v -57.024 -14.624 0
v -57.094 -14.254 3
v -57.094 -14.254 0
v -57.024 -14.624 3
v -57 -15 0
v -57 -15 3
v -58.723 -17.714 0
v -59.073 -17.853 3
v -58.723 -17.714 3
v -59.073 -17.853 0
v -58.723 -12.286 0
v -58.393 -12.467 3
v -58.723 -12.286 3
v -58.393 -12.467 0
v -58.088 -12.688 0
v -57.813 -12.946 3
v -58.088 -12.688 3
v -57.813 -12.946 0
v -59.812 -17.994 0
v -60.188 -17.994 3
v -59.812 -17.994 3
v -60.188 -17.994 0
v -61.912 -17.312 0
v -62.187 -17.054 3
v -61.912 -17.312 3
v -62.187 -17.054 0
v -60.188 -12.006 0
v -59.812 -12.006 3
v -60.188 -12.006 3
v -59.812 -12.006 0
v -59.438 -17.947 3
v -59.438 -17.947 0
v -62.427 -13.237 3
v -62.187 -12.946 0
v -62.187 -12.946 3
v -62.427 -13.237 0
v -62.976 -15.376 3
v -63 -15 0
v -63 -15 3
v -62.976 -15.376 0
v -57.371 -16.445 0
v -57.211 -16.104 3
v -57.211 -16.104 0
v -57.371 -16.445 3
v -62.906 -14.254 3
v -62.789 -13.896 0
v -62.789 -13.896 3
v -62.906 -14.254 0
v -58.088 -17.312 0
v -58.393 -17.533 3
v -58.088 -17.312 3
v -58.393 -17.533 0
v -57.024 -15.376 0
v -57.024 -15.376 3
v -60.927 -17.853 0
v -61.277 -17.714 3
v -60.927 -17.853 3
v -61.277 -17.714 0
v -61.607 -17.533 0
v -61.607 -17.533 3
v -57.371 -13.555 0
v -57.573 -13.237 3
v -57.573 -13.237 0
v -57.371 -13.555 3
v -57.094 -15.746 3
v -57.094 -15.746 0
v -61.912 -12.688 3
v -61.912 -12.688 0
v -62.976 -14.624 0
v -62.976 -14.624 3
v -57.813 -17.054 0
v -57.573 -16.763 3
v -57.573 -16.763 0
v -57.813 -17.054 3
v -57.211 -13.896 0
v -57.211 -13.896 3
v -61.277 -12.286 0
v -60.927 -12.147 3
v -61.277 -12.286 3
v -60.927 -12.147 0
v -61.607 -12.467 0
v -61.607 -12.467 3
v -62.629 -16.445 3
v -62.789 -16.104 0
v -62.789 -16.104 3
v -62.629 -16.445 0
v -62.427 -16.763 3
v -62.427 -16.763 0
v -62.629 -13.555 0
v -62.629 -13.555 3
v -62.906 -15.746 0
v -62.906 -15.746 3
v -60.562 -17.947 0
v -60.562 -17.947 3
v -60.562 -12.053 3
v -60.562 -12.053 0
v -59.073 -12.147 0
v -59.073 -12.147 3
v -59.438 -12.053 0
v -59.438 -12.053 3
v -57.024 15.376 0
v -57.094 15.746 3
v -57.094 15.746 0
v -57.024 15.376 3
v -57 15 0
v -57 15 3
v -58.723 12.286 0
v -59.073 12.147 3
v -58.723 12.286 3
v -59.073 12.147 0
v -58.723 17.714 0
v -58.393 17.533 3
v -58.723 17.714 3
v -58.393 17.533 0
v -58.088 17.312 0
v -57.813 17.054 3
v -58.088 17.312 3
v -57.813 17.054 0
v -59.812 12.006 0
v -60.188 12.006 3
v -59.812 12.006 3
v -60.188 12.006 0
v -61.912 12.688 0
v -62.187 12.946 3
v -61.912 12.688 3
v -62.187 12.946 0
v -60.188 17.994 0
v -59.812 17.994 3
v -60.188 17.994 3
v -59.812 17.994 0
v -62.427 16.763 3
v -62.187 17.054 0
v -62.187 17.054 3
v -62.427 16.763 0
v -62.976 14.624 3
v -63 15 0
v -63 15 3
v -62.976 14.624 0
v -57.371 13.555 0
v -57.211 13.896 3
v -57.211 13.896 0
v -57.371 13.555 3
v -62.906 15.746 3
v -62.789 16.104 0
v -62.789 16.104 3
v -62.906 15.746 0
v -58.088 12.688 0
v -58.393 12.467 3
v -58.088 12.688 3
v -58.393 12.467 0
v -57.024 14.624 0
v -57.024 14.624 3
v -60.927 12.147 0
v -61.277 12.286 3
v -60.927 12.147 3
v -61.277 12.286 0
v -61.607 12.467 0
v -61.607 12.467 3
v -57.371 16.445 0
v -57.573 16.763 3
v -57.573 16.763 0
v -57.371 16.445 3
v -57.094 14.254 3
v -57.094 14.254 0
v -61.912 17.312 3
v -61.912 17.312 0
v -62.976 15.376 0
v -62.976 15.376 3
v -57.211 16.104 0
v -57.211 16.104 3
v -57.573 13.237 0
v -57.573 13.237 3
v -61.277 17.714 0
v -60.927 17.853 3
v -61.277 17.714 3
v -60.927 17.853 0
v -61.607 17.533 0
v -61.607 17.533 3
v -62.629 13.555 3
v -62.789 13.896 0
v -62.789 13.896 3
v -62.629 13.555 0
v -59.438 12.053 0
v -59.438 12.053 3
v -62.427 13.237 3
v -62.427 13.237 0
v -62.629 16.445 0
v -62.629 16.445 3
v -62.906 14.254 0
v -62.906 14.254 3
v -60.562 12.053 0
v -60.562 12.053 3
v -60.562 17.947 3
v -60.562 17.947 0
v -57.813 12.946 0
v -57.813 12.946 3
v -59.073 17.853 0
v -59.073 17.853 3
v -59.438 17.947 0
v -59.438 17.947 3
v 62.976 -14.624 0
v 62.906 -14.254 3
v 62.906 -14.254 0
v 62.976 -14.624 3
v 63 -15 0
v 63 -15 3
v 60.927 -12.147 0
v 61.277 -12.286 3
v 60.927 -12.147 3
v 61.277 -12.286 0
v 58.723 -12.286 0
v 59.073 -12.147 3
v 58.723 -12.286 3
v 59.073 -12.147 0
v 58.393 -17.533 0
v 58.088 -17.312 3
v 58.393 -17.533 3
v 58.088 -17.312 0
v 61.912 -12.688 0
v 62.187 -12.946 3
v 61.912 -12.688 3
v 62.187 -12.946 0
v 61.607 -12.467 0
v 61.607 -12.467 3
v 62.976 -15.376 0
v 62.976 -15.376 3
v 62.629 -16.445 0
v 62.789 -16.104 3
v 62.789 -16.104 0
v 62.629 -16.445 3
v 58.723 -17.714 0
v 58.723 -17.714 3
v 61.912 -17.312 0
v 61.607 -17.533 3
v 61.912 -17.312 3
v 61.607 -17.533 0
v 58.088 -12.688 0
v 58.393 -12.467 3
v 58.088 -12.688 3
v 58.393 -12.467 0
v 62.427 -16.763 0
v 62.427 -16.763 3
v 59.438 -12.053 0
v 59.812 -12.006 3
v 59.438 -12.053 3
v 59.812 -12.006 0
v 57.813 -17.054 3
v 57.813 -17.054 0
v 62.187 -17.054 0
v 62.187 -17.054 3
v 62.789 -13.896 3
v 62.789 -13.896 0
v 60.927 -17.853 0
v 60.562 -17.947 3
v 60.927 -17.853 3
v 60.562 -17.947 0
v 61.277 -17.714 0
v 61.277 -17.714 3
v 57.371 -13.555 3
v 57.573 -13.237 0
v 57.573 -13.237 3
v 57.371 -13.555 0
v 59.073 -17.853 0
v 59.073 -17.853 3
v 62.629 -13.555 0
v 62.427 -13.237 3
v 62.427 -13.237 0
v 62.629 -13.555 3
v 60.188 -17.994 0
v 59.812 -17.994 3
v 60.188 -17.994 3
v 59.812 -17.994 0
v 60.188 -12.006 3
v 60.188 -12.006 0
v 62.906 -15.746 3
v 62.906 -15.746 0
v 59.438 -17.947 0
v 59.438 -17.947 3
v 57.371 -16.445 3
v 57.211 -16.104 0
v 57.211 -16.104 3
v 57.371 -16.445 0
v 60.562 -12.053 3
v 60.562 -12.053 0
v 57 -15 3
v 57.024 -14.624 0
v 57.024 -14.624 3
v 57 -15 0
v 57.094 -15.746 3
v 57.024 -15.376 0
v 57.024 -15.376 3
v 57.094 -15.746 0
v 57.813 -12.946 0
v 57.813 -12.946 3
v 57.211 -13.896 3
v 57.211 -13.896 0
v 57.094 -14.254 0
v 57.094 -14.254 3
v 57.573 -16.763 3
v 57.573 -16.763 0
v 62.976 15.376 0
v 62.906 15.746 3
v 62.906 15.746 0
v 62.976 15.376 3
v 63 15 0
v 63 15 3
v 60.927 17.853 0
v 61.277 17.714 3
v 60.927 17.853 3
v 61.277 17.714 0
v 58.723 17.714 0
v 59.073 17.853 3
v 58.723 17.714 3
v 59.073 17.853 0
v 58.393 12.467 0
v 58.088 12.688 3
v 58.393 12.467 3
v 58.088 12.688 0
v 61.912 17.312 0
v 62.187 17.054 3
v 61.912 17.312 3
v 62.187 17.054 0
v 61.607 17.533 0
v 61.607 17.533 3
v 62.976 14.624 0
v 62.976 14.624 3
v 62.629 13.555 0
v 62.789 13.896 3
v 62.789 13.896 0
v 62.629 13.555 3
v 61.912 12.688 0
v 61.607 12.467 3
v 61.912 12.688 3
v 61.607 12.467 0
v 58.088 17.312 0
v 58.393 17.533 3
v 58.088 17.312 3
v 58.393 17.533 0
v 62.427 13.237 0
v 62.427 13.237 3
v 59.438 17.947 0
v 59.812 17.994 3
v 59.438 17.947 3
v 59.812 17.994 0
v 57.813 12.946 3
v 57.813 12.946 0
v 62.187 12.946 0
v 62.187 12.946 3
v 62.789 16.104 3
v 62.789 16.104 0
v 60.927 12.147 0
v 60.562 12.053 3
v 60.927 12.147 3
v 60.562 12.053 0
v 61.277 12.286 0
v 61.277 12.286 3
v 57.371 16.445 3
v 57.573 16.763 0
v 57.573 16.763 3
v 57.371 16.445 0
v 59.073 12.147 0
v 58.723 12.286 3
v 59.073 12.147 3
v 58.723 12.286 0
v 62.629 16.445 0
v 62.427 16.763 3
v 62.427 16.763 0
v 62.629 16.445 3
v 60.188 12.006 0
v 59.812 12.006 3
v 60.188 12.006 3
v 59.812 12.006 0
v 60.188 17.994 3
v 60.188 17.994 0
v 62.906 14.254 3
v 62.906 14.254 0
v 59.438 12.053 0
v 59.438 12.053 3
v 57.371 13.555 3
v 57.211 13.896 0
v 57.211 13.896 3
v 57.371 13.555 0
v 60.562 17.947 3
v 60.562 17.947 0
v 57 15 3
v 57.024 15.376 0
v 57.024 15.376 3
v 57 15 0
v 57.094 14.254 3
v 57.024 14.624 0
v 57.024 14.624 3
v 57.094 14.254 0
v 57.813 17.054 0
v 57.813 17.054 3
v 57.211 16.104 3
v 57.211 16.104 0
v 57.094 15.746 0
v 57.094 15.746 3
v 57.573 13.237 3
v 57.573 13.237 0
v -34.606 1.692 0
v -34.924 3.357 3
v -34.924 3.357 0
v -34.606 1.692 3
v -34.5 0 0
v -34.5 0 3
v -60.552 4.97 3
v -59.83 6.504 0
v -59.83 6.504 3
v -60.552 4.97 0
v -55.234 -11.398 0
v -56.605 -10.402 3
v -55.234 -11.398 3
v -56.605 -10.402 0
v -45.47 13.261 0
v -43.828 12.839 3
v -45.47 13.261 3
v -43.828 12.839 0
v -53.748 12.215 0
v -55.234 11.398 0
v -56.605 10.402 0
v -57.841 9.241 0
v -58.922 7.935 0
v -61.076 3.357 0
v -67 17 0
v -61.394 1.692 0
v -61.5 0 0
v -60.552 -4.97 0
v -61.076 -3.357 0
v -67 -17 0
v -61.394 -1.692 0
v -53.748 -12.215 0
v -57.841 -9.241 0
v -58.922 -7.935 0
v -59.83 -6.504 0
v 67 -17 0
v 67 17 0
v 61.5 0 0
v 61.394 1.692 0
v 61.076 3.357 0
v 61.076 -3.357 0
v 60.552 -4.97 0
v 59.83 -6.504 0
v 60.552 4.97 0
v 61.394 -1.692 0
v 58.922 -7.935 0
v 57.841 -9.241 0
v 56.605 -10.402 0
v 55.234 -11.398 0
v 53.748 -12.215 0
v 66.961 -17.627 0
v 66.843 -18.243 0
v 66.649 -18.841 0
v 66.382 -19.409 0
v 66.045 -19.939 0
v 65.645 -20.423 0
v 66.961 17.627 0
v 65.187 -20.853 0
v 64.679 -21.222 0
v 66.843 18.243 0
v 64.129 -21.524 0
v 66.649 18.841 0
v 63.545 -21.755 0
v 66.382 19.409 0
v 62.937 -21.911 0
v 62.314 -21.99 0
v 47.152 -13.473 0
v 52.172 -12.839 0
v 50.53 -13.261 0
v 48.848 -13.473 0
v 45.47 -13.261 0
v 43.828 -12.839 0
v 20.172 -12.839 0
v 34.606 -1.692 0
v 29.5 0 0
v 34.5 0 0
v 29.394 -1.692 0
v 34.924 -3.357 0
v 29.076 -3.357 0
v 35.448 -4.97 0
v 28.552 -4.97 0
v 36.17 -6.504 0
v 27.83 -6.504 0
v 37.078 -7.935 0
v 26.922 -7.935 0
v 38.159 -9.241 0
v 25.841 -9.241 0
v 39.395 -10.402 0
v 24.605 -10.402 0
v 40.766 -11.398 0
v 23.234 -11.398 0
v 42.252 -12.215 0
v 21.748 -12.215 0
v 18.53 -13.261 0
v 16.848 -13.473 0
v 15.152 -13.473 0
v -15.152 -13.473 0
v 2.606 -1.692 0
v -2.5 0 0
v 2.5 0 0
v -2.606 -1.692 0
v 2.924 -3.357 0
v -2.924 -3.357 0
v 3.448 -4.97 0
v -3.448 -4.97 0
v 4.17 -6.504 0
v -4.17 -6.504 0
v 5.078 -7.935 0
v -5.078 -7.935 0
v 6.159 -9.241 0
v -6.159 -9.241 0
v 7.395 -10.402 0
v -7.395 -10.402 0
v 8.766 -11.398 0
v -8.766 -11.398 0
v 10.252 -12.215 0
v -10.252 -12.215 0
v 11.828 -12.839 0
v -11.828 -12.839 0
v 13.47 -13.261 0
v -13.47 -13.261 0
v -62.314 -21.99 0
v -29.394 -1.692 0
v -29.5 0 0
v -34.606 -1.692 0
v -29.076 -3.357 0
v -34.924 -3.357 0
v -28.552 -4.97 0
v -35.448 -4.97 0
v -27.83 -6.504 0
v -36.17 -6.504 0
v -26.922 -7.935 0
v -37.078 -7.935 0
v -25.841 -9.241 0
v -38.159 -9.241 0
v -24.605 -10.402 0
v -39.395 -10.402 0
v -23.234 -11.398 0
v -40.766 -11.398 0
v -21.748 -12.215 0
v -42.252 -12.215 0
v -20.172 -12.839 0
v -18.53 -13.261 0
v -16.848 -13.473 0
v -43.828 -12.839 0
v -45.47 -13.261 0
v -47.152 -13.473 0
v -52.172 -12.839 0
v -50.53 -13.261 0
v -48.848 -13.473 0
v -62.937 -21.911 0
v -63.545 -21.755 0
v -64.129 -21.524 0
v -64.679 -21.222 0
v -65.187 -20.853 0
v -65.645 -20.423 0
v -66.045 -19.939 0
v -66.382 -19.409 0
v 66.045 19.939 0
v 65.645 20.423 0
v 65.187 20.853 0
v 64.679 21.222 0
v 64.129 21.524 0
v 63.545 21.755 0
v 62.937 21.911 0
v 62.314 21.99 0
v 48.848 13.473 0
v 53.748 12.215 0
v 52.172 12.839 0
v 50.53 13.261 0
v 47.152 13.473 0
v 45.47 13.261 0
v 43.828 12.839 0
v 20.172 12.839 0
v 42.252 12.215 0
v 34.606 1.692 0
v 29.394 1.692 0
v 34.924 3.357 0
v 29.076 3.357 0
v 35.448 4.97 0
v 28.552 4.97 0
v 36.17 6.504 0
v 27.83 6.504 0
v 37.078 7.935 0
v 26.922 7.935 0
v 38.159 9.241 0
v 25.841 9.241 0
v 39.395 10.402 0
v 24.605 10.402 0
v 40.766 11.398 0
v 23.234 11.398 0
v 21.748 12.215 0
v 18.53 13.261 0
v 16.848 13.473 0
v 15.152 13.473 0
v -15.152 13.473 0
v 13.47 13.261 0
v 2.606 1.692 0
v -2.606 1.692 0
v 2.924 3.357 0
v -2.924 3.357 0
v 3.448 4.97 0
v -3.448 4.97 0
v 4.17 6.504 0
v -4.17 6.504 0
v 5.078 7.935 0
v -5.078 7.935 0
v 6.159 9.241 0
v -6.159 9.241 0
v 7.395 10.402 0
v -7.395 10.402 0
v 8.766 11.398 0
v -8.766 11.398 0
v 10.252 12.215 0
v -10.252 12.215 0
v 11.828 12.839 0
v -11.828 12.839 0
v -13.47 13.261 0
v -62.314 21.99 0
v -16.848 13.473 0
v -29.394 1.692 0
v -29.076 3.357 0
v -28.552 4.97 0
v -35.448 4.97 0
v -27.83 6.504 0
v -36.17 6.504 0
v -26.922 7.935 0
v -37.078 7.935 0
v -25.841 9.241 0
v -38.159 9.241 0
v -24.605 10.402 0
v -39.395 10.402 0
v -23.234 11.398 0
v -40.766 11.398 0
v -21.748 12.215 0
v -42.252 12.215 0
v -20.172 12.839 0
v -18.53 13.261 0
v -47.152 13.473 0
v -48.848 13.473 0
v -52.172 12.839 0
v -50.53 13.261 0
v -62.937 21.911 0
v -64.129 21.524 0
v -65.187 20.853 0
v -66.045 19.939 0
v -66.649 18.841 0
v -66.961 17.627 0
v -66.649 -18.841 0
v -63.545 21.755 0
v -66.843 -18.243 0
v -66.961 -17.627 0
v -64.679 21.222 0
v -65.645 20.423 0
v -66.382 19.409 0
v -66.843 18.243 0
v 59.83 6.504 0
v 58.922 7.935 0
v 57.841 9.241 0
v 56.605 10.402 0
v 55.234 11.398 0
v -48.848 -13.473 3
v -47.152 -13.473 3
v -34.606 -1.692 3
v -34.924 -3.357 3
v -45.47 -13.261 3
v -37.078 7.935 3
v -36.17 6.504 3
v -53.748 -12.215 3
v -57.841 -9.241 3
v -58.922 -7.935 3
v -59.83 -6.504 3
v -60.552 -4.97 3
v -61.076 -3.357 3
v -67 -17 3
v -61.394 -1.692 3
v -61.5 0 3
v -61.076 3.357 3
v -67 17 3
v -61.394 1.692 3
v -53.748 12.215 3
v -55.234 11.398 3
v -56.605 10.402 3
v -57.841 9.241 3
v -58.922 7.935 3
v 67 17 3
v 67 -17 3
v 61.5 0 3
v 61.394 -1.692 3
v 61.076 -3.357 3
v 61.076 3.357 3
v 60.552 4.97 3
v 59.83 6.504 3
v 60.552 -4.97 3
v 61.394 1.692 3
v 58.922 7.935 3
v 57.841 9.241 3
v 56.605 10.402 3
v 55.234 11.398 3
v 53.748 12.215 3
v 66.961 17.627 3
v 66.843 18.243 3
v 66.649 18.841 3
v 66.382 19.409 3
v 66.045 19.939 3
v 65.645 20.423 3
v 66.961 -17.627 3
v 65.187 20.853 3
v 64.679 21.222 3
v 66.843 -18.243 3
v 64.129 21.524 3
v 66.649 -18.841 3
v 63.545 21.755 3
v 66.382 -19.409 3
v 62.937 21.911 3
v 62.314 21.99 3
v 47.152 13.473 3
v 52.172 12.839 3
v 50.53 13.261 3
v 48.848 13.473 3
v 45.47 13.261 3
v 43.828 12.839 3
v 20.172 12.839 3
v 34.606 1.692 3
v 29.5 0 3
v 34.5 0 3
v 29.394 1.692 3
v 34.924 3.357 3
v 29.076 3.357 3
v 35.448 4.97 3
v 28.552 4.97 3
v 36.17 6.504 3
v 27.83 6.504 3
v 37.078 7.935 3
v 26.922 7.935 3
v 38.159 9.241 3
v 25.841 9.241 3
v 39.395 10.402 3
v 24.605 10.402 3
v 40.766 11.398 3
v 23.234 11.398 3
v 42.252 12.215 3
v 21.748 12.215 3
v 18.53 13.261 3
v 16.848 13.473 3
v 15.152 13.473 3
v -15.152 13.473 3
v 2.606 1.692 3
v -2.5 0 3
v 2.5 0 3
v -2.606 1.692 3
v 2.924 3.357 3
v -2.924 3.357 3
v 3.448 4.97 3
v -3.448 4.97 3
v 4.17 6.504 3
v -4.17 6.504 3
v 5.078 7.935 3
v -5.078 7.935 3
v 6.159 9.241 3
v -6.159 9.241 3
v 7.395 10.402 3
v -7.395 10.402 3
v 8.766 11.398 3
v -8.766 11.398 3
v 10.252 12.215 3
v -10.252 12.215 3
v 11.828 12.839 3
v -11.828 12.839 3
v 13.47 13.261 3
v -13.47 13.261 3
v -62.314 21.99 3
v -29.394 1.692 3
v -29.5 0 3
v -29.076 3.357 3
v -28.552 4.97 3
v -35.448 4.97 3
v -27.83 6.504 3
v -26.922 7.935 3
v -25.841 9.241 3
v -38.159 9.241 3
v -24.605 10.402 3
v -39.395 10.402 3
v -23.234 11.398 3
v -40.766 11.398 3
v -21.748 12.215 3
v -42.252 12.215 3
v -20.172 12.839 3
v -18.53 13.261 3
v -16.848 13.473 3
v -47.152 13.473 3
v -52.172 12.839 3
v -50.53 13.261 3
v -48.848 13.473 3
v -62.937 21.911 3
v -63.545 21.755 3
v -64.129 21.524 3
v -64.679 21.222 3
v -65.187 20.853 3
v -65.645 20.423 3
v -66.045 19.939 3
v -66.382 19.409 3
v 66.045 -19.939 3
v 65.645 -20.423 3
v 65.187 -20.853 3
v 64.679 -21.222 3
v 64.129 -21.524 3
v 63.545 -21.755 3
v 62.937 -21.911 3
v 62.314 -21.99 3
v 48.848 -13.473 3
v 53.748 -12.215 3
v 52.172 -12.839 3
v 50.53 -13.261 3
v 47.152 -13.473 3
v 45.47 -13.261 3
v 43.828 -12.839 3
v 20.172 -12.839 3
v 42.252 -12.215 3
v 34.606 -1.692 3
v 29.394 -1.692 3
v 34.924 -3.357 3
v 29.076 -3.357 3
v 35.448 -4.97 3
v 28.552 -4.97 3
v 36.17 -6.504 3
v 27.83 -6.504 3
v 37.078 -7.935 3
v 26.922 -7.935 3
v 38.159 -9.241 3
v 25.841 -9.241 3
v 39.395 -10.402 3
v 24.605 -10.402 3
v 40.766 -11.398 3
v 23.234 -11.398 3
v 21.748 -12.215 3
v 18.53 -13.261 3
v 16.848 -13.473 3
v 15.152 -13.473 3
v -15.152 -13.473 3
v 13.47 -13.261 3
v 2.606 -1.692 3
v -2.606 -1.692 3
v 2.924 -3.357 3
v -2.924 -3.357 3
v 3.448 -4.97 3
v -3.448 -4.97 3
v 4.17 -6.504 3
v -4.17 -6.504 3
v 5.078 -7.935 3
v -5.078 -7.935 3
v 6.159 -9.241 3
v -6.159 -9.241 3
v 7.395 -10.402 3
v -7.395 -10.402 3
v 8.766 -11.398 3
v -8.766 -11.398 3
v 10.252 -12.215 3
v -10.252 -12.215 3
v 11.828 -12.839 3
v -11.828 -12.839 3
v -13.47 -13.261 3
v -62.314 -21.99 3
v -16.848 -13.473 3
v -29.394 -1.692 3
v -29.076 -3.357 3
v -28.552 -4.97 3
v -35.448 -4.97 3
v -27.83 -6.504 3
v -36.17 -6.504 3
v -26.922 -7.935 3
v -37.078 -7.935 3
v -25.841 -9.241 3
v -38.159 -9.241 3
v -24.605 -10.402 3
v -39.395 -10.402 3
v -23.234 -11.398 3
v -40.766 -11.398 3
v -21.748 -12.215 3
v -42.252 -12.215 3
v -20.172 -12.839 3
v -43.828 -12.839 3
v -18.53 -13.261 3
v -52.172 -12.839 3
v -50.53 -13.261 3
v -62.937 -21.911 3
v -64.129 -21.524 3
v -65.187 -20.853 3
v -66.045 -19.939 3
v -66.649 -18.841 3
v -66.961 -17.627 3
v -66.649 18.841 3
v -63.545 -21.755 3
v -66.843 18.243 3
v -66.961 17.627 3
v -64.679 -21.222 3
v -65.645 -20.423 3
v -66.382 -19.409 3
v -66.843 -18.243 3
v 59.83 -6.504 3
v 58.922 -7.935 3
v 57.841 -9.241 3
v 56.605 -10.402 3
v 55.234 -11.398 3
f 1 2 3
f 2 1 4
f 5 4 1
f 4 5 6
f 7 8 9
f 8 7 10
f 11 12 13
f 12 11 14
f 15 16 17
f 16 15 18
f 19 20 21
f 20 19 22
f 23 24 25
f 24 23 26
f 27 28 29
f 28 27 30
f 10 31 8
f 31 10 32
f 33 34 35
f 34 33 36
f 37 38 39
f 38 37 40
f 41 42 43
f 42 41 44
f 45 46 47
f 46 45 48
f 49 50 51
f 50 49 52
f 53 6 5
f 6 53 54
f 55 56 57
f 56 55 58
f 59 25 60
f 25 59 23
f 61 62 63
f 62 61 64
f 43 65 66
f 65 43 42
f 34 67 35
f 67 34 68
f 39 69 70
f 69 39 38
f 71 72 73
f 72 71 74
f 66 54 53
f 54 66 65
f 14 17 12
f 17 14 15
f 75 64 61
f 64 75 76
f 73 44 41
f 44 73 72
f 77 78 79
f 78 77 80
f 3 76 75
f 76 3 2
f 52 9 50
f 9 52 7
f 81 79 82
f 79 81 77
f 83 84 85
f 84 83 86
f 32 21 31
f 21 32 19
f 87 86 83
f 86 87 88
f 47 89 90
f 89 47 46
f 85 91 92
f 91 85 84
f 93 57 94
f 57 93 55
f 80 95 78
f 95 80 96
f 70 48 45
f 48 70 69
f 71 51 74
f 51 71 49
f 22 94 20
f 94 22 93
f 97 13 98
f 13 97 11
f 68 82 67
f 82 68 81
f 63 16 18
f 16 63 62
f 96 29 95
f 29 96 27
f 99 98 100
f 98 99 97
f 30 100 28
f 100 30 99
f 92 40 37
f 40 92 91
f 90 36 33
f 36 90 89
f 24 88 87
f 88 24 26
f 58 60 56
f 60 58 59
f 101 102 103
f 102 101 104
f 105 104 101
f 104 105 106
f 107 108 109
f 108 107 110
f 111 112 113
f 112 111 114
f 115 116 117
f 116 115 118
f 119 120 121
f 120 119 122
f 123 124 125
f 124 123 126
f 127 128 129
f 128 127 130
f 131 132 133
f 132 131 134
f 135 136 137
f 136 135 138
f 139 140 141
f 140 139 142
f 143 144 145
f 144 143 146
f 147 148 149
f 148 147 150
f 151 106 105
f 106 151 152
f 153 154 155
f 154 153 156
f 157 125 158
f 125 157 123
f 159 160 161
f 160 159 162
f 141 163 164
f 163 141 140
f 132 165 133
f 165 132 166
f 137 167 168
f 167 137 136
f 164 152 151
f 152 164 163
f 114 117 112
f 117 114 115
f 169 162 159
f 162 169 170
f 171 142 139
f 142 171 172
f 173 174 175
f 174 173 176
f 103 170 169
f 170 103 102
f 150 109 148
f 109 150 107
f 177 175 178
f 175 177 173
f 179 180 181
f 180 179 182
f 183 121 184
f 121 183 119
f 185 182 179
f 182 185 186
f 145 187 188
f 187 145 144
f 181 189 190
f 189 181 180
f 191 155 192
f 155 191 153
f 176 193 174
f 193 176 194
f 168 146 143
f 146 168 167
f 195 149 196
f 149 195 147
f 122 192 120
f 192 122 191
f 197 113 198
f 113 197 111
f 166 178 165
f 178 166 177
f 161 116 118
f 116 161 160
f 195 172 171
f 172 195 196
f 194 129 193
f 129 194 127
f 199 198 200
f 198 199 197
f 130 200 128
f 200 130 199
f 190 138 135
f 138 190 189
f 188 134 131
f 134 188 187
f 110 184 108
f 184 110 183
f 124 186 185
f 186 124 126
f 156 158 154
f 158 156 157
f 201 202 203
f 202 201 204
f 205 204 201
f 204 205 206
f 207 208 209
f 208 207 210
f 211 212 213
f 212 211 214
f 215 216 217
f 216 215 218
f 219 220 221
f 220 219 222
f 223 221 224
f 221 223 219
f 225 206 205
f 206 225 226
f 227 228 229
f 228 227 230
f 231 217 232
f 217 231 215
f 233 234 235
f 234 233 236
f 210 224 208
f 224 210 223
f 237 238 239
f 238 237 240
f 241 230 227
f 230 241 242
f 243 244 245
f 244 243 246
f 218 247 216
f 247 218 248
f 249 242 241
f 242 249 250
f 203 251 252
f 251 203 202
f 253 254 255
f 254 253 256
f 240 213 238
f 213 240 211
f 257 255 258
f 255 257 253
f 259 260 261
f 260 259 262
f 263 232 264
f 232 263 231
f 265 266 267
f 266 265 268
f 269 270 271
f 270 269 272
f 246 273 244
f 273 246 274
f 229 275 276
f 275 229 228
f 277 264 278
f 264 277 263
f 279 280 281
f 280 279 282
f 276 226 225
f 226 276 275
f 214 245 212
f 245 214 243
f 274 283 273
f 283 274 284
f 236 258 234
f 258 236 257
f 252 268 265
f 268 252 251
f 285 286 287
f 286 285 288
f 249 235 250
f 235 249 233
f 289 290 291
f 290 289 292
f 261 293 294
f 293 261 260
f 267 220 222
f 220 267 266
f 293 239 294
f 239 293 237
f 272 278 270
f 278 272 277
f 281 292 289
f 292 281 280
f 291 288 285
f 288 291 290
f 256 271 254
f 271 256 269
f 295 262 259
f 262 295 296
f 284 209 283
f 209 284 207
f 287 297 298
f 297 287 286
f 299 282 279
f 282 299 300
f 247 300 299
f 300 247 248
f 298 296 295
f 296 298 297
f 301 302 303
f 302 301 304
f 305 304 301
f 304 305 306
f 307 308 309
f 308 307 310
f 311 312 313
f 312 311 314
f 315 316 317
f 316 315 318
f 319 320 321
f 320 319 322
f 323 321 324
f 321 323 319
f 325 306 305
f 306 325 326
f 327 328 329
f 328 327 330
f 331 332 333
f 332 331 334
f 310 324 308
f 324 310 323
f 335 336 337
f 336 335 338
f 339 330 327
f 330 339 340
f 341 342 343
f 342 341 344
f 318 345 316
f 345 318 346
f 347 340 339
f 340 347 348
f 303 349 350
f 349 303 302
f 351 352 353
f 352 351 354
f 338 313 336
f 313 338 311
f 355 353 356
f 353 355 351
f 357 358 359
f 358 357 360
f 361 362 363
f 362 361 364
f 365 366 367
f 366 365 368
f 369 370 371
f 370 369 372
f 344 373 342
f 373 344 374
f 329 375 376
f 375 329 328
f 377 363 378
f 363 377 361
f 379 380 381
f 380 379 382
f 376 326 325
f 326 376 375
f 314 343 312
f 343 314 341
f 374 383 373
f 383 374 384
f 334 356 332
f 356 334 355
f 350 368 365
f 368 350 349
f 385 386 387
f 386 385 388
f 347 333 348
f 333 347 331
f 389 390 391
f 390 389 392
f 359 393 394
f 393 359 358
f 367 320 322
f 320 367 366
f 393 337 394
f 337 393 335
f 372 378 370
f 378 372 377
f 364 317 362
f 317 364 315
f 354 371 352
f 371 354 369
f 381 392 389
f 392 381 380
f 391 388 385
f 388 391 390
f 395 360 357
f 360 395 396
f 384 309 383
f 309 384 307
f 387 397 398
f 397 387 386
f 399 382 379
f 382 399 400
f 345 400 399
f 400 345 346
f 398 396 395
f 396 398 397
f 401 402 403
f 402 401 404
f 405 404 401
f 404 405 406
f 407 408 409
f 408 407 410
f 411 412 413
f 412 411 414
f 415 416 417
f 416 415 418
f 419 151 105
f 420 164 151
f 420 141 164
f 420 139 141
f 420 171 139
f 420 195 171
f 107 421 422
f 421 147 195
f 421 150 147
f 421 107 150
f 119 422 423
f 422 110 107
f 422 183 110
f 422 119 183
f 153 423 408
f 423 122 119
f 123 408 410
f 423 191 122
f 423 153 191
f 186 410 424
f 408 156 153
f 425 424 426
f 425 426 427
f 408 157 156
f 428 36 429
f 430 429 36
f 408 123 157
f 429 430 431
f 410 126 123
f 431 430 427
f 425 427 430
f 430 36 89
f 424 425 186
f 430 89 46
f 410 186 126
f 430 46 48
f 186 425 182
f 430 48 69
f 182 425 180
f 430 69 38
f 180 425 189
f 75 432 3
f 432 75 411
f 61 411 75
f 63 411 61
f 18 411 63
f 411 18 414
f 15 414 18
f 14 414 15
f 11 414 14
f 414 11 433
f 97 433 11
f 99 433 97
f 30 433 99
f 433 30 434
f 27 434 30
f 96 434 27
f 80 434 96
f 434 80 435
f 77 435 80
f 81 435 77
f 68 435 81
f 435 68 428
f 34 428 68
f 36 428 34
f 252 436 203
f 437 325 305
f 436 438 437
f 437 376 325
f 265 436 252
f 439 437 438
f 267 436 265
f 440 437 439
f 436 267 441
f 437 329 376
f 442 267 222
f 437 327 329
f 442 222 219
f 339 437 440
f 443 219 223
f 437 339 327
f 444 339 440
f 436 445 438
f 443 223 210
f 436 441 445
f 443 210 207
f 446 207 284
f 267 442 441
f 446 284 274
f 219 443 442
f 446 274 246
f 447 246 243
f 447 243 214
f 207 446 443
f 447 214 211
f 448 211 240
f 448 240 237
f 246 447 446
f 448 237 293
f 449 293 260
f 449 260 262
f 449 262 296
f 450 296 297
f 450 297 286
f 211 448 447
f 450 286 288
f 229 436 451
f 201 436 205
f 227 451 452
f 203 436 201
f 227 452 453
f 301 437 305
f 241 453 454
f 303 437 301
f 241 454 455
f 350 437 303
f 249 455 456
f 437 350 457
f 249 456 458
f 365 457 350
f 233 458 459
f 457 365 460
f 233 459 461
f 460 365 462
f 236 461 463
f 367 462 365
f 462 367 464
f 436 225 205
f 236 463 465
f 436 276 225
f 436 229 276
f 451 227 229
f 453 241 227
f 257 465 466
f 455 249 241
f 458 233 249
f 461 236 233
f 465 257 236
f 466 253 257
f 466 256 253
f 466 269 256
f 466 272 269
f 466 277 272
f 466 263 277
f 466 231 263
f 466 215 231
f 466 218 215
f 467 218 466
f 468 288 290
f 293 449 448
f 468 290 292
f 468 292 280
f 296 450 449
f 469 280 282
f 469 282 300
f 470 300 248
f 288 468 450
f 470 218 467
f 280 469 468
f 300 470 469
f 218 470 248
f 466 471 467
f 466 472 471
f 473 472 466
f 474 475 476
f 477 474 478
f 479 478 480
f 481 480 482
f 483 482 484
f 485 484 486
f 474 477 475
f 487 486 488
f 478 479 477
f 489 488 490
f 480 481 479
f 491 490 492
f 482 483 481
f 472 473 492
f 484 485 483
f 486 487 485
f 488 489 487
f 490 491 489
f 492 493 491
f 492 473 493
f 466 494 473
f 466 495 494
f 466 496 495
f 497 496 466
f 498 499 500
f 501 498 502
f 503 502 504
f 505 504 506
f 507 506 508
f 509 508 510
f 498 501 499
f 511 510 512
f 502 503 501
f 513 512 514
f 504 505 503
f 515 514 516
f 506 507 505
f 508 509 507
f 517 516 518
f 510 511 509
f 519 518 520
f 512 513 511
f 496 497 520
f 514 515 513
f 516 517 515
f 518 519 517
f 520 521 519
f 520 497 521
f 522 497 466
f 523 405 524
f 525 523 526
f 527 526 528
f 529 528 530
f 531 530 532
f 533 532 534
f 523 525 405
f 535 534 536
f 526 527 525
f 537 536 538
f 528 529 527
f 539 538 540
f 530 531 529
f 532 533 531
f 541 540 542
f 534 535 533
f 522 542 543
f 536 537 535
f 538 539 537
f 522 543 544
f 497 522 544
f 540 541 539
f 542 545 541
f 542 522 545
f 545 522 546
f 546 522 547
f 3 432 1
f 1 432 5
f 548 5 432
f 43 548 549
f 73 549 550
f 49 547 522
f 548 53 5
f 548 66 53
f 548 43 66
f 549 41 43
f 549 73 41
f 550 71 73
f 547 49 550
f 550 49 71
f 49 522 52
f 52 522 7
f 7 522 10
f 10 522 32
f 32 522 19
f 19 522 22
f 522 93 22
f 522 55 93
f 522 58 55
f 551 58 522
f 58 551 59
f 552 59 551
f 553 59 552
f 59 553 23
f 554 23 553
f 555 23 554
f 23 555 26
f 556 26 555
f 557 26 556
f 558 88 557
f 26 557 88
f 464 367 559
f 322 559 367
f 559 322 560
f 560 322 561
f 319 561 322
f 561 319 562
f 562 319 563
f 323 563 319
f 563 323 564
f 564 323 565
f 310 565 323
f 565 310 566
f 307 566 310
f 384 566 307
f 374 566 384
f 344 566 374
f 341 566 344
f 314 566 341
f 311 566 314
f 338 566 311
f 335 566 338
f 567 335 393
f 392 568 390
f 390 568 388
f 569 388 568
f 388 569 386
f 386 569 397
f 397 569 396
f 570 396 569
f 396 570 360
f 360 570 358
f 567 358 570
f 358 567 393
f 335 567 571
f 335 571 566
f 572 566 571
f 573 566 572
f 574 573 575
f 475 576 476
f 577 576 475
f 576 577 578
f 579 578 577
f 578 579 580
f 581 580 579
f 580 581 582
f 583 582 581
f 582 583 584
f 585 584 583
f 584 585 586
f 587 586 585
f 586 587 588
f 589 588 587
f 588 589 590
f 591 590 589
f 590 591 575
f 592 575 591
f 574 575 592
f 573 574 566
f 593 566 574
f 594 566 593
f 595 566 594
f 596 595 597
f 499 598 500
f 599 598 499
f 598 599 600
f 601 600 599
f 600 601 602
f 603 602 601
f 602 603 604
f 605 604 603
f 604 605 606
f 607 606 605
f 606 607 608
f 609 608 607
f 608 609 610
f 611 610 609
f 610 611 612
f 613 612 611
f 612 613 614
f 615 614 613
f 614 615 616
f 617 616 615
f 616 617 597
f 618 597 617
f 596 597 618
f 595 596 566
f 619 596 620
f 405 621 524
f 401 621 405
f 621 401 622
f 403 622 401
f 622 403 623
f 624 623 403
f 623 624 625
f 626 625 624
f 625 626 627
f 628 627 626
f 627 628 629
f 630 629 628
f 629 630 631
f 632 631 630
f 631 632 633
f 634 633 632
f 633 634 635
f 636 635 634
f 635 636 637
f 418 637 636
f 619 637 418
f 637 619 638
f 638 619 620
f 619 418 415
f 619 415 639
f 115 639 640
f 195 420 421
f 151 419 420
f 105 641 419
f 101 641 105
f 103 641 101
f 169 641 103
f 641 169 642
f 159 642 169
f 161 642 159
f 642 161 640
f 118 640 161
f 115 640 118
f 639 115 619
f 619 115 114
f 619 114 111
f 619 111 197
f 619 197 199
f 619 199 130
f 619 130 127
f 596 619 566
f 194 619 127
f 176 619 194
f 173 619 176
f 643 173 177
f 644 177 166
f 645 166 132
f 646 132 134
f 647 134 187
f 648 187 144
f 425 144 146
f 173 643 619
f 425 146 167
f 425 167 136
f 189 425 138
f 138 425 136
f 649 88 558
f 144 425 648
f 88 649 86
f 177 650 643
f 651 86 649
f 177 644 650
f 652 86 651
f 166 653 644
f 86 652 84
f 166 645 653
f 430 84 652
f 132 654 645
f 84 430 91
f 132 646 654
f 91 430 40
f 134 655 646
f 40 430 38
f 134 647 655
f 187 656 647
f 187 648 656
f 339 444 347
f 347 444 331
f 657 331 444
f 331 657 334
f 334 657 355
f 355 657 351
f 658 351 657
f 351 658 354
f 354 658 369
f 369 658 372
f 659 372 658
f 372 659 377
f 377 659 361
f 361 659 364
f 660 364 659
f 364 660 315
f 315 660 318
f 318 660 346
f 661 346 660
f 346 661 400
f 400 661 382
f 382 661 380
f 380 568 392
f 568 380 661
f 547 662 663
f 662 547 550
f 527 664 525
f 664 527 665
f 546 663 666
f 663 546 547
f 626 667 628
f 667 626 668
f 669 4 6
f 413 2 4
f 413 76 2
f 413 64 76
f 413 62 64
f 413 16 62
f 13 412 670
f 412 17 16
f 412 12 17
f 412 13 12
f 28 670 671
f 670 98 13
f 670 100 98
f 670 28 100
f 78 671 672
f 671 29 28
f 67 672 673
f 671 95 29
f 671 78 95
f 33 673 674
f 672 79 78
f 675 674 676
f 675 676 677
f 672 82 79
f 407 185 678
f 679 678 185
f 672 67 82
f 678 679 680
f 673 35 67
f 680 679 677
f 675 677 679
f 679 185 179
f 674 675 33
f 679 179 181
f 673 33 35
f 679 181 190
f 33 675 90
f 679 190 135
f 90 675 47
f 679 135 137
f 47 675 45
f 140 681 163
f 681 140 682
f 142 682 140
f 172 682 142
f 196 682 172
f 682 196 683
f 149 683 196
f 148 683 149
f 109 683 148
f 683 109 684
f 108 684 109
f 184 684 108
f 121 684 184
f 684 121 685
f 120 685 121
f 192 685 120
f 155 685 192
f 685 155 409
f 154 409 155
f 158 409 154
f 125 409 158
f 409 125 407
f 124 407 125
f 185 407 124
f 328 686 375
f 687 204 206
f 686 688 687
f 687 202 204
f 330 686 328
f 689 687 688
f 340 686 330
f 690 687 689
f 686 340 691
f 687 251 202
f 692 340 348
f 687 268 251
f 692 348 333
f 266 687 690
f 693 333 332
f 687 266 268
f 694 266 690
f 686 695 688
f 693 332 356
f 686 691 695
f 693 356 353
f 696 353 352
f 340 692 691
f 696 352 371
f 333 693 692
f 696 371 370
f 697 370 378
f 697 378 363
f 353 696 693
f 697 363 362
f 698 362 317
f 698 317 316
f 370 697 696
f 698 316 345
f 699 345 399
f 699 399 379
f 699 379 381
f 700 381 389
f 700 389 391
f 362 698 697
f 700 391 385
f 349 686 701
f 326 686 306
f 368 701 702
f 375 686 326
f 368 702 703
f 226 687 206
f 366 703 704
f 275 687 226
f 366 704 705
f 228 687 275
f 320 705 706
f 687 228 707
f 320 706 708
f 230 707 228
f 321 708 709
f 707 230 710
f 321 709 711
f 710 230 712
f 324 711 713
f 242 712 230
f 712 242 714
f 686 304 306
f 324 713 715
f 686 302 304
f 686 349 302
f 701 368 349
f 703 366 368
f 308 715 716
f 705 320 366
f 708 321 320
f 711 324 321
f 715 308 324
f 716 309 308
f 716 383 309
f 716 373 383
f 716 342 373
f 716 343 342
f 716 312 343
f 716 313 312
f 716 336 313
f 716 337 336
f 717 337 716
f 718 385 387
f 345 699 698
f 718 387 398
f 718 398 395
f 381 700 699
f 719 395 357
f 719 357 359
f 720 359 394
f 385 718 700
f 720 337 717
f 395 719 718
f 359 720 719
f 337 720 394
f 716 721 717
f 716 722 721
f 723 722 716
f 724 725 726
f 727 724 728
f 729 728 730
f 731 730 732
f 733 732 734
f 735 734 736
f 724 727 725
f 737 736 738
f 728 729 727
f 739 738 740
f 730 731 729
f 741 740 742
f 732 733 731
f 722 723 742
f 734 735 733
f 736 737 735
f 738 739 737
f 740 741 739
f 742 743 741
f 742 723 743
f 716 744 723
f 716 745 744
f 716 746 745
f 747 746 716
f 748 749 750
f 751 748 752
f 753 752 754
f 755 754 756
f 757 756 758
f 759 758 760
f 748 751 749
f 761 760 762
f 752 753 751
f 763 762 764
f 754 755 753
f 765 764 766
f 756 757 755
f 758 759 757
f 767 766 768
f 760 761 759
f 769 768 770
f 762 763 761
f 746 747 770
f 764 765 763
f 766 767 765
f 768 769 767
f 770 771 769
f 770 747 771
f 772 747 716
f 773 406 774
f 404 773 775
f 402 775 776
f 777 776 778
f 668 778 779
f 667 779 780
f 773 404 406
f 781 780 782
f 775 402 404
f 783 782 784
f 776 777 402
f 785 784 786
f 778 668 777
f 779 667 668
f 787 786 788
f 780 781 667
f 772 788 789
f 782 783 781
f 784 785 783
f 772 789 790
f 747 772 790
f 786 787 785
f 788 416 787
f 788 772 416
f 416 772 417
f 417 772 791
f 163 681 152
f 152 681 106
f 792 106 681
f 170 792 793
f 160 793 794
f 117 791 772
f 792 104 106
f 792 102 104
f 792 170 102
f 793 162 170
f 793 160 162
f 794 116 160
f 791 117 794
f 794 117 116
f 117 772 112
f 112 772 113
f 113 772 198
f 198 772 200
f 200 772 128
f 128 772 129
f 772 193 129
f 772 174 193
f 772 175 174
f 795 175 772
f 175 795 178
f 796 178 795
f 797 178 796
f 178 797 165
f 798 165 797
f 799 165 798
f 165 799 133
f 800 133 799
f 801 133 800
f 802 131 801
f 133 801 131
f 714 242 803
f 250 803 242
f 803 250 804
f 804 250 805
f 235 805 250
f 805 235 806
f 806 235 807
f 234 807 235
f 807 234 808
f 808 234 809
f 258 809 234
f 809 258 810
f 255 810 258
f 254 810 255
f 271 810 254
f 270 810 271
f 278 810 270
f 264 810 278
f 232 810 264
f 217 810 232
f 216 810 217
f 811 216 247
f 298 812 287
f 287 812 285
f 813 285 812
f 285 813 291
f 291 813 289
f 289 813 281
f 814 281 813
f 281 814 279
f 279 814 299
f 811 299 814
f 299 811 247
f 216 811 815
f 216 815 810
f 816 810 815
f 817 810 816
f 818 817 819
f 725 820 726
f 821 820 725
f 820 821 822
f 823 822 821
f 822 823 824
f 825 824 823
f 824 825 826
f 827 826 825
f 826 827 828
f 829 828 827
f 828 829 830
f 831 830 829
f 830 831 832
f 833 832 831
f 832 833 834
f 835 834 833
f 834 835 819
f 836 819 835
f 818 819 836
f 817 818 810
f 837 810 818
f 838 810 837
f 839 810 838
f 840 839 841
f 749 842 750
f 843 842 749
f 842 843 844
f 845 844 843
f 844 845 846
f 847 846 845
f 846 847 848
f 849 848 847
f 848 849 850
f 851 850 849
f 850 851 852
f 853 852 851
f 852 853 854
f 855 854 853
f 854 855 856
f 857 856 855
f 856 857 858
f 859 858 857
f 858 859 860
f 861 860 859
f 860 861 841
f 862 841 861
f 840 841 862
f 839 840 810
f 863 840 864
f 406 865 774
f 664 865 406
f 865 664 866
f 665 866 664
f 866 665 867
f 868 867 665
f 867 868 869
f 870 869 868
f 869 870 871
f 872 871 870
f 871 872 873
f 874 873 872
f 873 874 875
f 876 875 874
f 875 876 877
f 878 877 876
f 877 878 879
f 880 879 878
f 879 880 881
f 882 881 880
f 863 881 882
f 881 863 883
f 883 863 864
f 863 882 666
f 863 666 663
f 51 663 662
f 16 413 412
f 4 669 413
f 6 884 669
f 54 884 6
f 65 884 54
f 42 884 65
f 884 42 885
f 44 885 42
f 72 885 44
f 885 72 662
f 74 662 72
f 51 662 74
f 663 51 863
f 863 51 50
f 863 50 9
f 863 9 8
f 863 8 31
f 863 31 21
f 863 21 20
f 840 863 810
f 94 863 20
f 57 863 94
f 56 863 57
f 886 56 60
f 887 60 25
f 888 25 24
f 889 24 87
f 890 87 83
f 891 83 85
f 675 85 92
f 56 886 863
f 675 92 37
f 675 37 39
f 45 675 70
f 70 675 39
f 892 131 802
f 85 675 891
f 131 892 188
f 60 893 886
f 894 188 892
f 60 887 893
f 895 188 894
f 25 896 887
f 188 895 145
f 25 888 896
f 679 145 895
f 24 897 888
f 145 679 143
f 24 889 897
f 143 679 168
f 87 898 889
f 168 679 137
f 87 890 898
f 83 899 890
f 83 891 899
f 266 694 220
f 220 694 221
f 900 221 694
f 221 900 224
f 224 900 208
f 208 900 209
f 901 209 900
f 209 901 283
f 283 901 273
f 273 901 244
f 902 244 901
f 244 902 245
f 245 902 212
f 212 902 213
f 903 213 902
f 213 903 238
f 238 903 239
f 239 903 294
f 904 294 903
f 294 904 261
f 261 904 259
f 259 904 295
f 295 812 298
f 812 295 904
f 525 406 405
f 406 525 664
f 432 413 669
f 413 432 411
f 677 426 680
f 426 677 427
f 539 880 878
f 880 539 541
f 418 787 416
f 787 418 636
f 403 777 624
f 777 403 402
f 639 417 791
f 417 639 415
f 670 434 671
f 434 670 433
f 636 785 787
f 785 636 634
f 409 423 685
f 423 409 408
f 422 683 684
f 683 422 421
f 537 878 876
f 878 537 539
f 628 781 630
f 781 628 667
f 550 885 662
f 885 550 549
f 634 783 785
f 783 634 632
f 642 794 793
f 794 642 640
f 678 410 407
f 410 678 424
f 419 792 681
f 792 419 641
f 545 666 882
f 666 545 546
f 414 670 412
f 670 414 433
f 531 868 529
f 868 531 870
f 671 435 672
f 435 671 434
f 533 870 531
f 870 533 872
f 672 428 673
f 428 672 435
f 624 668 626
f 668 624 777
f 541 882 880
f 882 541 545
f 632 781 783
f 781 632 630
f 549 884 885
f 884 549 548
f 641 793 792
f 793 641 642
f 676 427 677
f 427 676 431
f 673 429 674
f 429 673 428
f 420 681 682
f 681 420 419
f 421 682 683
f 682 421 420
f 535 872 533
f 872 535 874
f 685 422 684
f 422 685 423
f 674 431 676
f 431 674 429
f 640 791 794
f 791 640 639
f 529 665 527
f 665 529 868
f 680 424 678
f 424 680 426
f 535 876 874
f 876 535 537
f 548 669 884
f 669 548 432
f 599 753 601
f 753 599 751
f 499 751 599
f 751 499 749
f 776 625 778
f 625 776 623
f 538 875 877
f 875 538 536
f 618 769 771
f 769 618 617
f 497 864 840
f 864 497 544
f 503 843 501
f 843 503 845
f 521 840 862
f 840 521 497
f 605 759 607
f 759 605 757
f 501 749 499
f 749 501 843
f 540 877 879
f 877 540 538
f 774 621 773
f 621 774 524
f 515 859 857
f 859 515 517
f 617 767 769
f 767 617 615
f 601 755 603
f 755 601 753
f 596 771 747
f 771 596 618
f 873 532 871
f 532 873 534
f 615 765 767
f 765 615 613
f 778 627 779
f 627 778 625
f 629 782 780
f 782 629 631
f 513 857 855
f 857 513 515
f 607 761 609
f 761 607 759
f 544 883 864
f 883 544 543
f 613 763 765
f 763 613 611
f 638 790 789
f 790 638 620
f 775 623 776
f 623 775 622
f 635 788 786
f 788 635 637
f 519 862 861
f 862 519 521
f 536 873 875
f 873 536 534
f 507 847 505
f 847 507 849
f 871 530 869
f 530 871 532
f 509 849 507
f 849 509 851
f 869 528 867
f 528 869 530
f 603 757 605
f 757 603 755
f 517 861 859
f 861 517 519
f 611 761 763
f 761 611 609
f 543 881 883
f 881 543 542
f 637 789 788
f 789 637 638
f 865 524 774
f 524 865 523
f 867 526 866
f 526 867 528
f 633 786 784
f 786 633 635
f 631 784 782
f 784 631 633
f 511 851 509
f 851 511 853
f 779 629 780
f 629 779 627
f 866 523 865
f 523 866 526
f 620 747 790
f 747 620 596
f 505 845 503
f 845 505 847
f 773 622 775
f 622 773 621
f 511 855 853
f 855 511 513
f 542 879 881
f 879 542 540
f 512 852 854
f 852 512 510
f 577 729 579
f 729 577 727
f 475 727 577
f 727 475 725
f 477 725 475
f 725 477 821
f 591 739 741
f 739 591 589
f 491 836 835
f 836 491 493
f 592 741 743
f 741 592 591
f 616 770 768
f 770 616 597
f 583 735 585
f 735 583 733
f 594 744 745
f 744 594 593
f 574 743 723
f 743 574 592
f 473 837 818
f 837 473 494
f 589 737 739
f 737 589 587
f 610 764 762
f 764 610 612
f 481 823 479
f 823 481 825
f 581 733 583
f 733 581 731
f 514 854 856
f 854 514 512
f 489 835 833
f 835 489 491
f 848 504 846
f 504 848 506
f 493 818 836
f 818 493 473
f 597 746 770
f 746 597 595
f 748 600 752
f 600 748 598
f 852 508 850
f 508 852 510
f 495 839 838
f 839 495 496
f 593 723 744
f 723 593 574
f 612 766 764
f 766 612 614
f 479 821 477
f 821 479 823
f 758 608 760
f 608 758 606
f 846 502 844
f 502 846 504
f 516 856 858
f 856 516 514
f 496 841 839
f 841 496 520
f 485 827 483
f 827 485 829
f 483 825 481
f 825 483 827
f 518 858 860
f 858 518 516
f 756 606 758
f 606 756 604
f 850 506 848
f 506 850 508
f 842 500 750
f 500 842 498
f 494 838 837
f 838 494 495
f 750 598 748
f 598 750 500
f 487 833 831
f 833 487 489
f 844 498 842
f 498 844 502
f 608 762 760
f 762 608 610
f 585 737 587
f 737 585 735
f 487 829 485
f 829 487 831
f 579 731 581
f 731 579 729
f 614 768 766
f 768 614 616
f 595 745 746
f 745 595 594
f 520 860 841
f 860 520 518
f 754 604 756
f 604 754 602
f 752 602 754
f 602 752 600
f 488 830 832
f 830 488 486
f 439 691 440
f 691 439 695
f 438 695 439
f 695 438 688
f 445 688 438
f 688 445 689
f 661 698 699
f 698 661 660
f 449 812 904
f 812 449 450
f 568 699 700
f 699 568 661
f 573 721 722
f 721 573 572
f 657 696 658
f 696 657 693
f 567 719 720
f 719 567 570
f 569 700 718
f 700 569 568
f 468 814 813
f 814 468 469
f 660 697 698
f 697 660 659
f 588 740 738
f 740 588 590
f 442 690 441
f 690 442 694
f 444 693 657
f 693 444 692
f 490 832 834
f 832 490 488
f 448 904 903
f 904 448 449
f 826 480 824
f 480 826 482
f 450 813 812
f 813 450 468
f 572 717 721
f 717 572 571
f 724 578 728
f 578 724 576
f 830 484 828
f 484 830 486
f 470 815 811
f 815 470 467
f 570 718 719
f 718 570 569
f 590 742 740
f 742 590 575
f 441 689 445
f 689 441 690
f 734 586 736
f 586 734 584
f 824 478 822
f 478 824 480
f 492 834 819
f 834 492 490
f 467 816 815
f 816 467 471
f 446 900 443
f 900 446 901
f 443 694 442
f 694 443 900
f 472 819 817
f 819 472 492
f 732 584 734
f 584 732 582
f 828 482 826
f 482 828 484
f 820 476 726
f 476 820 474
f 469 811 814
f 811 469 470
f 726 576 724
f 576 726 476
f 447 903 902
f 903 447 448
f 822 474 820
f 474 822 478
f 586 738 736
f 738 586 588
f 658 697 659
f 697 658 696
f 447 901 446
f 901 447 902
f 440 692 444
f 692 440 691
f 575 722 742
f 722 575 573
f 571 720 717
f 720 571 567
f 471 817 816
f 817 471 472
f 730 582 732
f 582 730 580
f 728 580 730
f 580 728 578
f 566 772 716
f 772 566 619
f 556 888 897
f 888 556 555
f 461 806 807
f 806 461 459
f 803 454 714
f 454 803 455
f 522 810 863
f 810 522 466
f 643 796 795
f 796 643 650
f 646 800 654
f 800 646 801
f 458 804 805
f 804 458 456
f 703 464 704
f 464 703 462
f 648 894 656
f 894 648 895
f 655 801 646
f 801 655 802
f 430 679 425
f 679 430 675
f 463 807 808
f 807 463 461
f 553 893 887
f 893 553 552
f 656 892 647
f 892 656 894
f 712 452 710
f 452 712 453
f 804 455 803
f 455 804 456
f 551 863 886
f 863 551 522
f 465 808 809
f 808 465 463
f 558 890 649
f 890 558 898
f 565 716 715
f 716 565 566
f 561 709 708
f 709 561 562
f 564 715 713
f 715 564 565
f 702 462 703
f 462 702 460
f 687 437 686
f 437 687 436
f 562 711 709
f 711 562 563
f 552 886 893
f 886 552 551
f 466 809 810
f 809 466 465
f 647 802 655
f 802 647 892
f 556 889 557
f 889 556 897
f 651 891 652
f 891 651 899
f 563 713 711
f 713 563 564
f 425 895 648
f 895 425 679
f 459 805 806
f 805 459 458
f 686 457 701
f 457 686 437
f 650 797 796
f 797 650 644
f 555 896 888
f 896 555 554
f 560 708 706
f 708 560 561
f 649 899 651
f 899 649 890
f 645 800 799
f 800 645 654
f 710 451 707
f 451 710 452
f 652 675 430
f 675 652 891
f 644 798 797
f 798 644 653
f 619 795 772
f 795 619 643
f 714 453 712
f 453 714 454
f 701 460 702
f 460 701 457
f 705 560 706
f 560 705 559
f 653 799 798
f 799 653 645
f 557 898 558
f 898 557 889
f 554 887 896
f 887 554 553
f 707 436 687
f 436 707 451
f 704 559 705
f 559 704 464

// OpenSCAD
$fn = 50;


difference() {
	union() {
		hull() {
			translate(v = [-62.0000000000, 17.0000000000, 0]) {
				cylinder(h = 3, r = 5);
			}
			translate(v = [62.0000000000, 17.0000000000, 0]) {
				cylinder(h = 3, r = 5);
			}
			translate(v = [-62.0000000000, -17.0000000000, 0]) {
				cylinder(h = 3, r = 5);
			}
			translate(v = [62.0000000000, -17.0000000000, 0]) {
				cylinder(h = 3, r = 5);
			}
		}
	}
	union() {
		#translate(v = [-60.0000000000, -15.0000000000, -100.0000000000]) {
			cylinder(h = 200, r = 3.0000000000);
		}
		#translate(v = [-60.0000000000, 15.0000000000, -100.0000000000]) {
			cylinder(h = 200, r = 3.0000000000);
		}
		#translate(v = [60.0000000000, -15.0000000000, -100.0000000000]) {
			cylinder(h = 200, r = 3.0000000000);
		}
		#translate(v = [60.0000000000, 15.0000000000, -100.0000000000]) {
			cylinder(h = 200, r = 3.0000000000);
		}
		#translate(v = [-48.0000000000, 0, 0]) {
			cylinder(h = 3, r = 13.5000000000);
		}
		#translate(v = [-16.0000000000, 0, 0]) {
			cylinder(h = 3, r = 13.5000000000);
		}
		#translate(v = [16.0000000000, 0, 0]) {
			cylinder(h = 3, r = 13.5000000000);
		}
		#translate(v = [48.0000000000, 0, 0]) {
			cylinder(h = 3, r = 13.5000000000);
		}
	}
}
